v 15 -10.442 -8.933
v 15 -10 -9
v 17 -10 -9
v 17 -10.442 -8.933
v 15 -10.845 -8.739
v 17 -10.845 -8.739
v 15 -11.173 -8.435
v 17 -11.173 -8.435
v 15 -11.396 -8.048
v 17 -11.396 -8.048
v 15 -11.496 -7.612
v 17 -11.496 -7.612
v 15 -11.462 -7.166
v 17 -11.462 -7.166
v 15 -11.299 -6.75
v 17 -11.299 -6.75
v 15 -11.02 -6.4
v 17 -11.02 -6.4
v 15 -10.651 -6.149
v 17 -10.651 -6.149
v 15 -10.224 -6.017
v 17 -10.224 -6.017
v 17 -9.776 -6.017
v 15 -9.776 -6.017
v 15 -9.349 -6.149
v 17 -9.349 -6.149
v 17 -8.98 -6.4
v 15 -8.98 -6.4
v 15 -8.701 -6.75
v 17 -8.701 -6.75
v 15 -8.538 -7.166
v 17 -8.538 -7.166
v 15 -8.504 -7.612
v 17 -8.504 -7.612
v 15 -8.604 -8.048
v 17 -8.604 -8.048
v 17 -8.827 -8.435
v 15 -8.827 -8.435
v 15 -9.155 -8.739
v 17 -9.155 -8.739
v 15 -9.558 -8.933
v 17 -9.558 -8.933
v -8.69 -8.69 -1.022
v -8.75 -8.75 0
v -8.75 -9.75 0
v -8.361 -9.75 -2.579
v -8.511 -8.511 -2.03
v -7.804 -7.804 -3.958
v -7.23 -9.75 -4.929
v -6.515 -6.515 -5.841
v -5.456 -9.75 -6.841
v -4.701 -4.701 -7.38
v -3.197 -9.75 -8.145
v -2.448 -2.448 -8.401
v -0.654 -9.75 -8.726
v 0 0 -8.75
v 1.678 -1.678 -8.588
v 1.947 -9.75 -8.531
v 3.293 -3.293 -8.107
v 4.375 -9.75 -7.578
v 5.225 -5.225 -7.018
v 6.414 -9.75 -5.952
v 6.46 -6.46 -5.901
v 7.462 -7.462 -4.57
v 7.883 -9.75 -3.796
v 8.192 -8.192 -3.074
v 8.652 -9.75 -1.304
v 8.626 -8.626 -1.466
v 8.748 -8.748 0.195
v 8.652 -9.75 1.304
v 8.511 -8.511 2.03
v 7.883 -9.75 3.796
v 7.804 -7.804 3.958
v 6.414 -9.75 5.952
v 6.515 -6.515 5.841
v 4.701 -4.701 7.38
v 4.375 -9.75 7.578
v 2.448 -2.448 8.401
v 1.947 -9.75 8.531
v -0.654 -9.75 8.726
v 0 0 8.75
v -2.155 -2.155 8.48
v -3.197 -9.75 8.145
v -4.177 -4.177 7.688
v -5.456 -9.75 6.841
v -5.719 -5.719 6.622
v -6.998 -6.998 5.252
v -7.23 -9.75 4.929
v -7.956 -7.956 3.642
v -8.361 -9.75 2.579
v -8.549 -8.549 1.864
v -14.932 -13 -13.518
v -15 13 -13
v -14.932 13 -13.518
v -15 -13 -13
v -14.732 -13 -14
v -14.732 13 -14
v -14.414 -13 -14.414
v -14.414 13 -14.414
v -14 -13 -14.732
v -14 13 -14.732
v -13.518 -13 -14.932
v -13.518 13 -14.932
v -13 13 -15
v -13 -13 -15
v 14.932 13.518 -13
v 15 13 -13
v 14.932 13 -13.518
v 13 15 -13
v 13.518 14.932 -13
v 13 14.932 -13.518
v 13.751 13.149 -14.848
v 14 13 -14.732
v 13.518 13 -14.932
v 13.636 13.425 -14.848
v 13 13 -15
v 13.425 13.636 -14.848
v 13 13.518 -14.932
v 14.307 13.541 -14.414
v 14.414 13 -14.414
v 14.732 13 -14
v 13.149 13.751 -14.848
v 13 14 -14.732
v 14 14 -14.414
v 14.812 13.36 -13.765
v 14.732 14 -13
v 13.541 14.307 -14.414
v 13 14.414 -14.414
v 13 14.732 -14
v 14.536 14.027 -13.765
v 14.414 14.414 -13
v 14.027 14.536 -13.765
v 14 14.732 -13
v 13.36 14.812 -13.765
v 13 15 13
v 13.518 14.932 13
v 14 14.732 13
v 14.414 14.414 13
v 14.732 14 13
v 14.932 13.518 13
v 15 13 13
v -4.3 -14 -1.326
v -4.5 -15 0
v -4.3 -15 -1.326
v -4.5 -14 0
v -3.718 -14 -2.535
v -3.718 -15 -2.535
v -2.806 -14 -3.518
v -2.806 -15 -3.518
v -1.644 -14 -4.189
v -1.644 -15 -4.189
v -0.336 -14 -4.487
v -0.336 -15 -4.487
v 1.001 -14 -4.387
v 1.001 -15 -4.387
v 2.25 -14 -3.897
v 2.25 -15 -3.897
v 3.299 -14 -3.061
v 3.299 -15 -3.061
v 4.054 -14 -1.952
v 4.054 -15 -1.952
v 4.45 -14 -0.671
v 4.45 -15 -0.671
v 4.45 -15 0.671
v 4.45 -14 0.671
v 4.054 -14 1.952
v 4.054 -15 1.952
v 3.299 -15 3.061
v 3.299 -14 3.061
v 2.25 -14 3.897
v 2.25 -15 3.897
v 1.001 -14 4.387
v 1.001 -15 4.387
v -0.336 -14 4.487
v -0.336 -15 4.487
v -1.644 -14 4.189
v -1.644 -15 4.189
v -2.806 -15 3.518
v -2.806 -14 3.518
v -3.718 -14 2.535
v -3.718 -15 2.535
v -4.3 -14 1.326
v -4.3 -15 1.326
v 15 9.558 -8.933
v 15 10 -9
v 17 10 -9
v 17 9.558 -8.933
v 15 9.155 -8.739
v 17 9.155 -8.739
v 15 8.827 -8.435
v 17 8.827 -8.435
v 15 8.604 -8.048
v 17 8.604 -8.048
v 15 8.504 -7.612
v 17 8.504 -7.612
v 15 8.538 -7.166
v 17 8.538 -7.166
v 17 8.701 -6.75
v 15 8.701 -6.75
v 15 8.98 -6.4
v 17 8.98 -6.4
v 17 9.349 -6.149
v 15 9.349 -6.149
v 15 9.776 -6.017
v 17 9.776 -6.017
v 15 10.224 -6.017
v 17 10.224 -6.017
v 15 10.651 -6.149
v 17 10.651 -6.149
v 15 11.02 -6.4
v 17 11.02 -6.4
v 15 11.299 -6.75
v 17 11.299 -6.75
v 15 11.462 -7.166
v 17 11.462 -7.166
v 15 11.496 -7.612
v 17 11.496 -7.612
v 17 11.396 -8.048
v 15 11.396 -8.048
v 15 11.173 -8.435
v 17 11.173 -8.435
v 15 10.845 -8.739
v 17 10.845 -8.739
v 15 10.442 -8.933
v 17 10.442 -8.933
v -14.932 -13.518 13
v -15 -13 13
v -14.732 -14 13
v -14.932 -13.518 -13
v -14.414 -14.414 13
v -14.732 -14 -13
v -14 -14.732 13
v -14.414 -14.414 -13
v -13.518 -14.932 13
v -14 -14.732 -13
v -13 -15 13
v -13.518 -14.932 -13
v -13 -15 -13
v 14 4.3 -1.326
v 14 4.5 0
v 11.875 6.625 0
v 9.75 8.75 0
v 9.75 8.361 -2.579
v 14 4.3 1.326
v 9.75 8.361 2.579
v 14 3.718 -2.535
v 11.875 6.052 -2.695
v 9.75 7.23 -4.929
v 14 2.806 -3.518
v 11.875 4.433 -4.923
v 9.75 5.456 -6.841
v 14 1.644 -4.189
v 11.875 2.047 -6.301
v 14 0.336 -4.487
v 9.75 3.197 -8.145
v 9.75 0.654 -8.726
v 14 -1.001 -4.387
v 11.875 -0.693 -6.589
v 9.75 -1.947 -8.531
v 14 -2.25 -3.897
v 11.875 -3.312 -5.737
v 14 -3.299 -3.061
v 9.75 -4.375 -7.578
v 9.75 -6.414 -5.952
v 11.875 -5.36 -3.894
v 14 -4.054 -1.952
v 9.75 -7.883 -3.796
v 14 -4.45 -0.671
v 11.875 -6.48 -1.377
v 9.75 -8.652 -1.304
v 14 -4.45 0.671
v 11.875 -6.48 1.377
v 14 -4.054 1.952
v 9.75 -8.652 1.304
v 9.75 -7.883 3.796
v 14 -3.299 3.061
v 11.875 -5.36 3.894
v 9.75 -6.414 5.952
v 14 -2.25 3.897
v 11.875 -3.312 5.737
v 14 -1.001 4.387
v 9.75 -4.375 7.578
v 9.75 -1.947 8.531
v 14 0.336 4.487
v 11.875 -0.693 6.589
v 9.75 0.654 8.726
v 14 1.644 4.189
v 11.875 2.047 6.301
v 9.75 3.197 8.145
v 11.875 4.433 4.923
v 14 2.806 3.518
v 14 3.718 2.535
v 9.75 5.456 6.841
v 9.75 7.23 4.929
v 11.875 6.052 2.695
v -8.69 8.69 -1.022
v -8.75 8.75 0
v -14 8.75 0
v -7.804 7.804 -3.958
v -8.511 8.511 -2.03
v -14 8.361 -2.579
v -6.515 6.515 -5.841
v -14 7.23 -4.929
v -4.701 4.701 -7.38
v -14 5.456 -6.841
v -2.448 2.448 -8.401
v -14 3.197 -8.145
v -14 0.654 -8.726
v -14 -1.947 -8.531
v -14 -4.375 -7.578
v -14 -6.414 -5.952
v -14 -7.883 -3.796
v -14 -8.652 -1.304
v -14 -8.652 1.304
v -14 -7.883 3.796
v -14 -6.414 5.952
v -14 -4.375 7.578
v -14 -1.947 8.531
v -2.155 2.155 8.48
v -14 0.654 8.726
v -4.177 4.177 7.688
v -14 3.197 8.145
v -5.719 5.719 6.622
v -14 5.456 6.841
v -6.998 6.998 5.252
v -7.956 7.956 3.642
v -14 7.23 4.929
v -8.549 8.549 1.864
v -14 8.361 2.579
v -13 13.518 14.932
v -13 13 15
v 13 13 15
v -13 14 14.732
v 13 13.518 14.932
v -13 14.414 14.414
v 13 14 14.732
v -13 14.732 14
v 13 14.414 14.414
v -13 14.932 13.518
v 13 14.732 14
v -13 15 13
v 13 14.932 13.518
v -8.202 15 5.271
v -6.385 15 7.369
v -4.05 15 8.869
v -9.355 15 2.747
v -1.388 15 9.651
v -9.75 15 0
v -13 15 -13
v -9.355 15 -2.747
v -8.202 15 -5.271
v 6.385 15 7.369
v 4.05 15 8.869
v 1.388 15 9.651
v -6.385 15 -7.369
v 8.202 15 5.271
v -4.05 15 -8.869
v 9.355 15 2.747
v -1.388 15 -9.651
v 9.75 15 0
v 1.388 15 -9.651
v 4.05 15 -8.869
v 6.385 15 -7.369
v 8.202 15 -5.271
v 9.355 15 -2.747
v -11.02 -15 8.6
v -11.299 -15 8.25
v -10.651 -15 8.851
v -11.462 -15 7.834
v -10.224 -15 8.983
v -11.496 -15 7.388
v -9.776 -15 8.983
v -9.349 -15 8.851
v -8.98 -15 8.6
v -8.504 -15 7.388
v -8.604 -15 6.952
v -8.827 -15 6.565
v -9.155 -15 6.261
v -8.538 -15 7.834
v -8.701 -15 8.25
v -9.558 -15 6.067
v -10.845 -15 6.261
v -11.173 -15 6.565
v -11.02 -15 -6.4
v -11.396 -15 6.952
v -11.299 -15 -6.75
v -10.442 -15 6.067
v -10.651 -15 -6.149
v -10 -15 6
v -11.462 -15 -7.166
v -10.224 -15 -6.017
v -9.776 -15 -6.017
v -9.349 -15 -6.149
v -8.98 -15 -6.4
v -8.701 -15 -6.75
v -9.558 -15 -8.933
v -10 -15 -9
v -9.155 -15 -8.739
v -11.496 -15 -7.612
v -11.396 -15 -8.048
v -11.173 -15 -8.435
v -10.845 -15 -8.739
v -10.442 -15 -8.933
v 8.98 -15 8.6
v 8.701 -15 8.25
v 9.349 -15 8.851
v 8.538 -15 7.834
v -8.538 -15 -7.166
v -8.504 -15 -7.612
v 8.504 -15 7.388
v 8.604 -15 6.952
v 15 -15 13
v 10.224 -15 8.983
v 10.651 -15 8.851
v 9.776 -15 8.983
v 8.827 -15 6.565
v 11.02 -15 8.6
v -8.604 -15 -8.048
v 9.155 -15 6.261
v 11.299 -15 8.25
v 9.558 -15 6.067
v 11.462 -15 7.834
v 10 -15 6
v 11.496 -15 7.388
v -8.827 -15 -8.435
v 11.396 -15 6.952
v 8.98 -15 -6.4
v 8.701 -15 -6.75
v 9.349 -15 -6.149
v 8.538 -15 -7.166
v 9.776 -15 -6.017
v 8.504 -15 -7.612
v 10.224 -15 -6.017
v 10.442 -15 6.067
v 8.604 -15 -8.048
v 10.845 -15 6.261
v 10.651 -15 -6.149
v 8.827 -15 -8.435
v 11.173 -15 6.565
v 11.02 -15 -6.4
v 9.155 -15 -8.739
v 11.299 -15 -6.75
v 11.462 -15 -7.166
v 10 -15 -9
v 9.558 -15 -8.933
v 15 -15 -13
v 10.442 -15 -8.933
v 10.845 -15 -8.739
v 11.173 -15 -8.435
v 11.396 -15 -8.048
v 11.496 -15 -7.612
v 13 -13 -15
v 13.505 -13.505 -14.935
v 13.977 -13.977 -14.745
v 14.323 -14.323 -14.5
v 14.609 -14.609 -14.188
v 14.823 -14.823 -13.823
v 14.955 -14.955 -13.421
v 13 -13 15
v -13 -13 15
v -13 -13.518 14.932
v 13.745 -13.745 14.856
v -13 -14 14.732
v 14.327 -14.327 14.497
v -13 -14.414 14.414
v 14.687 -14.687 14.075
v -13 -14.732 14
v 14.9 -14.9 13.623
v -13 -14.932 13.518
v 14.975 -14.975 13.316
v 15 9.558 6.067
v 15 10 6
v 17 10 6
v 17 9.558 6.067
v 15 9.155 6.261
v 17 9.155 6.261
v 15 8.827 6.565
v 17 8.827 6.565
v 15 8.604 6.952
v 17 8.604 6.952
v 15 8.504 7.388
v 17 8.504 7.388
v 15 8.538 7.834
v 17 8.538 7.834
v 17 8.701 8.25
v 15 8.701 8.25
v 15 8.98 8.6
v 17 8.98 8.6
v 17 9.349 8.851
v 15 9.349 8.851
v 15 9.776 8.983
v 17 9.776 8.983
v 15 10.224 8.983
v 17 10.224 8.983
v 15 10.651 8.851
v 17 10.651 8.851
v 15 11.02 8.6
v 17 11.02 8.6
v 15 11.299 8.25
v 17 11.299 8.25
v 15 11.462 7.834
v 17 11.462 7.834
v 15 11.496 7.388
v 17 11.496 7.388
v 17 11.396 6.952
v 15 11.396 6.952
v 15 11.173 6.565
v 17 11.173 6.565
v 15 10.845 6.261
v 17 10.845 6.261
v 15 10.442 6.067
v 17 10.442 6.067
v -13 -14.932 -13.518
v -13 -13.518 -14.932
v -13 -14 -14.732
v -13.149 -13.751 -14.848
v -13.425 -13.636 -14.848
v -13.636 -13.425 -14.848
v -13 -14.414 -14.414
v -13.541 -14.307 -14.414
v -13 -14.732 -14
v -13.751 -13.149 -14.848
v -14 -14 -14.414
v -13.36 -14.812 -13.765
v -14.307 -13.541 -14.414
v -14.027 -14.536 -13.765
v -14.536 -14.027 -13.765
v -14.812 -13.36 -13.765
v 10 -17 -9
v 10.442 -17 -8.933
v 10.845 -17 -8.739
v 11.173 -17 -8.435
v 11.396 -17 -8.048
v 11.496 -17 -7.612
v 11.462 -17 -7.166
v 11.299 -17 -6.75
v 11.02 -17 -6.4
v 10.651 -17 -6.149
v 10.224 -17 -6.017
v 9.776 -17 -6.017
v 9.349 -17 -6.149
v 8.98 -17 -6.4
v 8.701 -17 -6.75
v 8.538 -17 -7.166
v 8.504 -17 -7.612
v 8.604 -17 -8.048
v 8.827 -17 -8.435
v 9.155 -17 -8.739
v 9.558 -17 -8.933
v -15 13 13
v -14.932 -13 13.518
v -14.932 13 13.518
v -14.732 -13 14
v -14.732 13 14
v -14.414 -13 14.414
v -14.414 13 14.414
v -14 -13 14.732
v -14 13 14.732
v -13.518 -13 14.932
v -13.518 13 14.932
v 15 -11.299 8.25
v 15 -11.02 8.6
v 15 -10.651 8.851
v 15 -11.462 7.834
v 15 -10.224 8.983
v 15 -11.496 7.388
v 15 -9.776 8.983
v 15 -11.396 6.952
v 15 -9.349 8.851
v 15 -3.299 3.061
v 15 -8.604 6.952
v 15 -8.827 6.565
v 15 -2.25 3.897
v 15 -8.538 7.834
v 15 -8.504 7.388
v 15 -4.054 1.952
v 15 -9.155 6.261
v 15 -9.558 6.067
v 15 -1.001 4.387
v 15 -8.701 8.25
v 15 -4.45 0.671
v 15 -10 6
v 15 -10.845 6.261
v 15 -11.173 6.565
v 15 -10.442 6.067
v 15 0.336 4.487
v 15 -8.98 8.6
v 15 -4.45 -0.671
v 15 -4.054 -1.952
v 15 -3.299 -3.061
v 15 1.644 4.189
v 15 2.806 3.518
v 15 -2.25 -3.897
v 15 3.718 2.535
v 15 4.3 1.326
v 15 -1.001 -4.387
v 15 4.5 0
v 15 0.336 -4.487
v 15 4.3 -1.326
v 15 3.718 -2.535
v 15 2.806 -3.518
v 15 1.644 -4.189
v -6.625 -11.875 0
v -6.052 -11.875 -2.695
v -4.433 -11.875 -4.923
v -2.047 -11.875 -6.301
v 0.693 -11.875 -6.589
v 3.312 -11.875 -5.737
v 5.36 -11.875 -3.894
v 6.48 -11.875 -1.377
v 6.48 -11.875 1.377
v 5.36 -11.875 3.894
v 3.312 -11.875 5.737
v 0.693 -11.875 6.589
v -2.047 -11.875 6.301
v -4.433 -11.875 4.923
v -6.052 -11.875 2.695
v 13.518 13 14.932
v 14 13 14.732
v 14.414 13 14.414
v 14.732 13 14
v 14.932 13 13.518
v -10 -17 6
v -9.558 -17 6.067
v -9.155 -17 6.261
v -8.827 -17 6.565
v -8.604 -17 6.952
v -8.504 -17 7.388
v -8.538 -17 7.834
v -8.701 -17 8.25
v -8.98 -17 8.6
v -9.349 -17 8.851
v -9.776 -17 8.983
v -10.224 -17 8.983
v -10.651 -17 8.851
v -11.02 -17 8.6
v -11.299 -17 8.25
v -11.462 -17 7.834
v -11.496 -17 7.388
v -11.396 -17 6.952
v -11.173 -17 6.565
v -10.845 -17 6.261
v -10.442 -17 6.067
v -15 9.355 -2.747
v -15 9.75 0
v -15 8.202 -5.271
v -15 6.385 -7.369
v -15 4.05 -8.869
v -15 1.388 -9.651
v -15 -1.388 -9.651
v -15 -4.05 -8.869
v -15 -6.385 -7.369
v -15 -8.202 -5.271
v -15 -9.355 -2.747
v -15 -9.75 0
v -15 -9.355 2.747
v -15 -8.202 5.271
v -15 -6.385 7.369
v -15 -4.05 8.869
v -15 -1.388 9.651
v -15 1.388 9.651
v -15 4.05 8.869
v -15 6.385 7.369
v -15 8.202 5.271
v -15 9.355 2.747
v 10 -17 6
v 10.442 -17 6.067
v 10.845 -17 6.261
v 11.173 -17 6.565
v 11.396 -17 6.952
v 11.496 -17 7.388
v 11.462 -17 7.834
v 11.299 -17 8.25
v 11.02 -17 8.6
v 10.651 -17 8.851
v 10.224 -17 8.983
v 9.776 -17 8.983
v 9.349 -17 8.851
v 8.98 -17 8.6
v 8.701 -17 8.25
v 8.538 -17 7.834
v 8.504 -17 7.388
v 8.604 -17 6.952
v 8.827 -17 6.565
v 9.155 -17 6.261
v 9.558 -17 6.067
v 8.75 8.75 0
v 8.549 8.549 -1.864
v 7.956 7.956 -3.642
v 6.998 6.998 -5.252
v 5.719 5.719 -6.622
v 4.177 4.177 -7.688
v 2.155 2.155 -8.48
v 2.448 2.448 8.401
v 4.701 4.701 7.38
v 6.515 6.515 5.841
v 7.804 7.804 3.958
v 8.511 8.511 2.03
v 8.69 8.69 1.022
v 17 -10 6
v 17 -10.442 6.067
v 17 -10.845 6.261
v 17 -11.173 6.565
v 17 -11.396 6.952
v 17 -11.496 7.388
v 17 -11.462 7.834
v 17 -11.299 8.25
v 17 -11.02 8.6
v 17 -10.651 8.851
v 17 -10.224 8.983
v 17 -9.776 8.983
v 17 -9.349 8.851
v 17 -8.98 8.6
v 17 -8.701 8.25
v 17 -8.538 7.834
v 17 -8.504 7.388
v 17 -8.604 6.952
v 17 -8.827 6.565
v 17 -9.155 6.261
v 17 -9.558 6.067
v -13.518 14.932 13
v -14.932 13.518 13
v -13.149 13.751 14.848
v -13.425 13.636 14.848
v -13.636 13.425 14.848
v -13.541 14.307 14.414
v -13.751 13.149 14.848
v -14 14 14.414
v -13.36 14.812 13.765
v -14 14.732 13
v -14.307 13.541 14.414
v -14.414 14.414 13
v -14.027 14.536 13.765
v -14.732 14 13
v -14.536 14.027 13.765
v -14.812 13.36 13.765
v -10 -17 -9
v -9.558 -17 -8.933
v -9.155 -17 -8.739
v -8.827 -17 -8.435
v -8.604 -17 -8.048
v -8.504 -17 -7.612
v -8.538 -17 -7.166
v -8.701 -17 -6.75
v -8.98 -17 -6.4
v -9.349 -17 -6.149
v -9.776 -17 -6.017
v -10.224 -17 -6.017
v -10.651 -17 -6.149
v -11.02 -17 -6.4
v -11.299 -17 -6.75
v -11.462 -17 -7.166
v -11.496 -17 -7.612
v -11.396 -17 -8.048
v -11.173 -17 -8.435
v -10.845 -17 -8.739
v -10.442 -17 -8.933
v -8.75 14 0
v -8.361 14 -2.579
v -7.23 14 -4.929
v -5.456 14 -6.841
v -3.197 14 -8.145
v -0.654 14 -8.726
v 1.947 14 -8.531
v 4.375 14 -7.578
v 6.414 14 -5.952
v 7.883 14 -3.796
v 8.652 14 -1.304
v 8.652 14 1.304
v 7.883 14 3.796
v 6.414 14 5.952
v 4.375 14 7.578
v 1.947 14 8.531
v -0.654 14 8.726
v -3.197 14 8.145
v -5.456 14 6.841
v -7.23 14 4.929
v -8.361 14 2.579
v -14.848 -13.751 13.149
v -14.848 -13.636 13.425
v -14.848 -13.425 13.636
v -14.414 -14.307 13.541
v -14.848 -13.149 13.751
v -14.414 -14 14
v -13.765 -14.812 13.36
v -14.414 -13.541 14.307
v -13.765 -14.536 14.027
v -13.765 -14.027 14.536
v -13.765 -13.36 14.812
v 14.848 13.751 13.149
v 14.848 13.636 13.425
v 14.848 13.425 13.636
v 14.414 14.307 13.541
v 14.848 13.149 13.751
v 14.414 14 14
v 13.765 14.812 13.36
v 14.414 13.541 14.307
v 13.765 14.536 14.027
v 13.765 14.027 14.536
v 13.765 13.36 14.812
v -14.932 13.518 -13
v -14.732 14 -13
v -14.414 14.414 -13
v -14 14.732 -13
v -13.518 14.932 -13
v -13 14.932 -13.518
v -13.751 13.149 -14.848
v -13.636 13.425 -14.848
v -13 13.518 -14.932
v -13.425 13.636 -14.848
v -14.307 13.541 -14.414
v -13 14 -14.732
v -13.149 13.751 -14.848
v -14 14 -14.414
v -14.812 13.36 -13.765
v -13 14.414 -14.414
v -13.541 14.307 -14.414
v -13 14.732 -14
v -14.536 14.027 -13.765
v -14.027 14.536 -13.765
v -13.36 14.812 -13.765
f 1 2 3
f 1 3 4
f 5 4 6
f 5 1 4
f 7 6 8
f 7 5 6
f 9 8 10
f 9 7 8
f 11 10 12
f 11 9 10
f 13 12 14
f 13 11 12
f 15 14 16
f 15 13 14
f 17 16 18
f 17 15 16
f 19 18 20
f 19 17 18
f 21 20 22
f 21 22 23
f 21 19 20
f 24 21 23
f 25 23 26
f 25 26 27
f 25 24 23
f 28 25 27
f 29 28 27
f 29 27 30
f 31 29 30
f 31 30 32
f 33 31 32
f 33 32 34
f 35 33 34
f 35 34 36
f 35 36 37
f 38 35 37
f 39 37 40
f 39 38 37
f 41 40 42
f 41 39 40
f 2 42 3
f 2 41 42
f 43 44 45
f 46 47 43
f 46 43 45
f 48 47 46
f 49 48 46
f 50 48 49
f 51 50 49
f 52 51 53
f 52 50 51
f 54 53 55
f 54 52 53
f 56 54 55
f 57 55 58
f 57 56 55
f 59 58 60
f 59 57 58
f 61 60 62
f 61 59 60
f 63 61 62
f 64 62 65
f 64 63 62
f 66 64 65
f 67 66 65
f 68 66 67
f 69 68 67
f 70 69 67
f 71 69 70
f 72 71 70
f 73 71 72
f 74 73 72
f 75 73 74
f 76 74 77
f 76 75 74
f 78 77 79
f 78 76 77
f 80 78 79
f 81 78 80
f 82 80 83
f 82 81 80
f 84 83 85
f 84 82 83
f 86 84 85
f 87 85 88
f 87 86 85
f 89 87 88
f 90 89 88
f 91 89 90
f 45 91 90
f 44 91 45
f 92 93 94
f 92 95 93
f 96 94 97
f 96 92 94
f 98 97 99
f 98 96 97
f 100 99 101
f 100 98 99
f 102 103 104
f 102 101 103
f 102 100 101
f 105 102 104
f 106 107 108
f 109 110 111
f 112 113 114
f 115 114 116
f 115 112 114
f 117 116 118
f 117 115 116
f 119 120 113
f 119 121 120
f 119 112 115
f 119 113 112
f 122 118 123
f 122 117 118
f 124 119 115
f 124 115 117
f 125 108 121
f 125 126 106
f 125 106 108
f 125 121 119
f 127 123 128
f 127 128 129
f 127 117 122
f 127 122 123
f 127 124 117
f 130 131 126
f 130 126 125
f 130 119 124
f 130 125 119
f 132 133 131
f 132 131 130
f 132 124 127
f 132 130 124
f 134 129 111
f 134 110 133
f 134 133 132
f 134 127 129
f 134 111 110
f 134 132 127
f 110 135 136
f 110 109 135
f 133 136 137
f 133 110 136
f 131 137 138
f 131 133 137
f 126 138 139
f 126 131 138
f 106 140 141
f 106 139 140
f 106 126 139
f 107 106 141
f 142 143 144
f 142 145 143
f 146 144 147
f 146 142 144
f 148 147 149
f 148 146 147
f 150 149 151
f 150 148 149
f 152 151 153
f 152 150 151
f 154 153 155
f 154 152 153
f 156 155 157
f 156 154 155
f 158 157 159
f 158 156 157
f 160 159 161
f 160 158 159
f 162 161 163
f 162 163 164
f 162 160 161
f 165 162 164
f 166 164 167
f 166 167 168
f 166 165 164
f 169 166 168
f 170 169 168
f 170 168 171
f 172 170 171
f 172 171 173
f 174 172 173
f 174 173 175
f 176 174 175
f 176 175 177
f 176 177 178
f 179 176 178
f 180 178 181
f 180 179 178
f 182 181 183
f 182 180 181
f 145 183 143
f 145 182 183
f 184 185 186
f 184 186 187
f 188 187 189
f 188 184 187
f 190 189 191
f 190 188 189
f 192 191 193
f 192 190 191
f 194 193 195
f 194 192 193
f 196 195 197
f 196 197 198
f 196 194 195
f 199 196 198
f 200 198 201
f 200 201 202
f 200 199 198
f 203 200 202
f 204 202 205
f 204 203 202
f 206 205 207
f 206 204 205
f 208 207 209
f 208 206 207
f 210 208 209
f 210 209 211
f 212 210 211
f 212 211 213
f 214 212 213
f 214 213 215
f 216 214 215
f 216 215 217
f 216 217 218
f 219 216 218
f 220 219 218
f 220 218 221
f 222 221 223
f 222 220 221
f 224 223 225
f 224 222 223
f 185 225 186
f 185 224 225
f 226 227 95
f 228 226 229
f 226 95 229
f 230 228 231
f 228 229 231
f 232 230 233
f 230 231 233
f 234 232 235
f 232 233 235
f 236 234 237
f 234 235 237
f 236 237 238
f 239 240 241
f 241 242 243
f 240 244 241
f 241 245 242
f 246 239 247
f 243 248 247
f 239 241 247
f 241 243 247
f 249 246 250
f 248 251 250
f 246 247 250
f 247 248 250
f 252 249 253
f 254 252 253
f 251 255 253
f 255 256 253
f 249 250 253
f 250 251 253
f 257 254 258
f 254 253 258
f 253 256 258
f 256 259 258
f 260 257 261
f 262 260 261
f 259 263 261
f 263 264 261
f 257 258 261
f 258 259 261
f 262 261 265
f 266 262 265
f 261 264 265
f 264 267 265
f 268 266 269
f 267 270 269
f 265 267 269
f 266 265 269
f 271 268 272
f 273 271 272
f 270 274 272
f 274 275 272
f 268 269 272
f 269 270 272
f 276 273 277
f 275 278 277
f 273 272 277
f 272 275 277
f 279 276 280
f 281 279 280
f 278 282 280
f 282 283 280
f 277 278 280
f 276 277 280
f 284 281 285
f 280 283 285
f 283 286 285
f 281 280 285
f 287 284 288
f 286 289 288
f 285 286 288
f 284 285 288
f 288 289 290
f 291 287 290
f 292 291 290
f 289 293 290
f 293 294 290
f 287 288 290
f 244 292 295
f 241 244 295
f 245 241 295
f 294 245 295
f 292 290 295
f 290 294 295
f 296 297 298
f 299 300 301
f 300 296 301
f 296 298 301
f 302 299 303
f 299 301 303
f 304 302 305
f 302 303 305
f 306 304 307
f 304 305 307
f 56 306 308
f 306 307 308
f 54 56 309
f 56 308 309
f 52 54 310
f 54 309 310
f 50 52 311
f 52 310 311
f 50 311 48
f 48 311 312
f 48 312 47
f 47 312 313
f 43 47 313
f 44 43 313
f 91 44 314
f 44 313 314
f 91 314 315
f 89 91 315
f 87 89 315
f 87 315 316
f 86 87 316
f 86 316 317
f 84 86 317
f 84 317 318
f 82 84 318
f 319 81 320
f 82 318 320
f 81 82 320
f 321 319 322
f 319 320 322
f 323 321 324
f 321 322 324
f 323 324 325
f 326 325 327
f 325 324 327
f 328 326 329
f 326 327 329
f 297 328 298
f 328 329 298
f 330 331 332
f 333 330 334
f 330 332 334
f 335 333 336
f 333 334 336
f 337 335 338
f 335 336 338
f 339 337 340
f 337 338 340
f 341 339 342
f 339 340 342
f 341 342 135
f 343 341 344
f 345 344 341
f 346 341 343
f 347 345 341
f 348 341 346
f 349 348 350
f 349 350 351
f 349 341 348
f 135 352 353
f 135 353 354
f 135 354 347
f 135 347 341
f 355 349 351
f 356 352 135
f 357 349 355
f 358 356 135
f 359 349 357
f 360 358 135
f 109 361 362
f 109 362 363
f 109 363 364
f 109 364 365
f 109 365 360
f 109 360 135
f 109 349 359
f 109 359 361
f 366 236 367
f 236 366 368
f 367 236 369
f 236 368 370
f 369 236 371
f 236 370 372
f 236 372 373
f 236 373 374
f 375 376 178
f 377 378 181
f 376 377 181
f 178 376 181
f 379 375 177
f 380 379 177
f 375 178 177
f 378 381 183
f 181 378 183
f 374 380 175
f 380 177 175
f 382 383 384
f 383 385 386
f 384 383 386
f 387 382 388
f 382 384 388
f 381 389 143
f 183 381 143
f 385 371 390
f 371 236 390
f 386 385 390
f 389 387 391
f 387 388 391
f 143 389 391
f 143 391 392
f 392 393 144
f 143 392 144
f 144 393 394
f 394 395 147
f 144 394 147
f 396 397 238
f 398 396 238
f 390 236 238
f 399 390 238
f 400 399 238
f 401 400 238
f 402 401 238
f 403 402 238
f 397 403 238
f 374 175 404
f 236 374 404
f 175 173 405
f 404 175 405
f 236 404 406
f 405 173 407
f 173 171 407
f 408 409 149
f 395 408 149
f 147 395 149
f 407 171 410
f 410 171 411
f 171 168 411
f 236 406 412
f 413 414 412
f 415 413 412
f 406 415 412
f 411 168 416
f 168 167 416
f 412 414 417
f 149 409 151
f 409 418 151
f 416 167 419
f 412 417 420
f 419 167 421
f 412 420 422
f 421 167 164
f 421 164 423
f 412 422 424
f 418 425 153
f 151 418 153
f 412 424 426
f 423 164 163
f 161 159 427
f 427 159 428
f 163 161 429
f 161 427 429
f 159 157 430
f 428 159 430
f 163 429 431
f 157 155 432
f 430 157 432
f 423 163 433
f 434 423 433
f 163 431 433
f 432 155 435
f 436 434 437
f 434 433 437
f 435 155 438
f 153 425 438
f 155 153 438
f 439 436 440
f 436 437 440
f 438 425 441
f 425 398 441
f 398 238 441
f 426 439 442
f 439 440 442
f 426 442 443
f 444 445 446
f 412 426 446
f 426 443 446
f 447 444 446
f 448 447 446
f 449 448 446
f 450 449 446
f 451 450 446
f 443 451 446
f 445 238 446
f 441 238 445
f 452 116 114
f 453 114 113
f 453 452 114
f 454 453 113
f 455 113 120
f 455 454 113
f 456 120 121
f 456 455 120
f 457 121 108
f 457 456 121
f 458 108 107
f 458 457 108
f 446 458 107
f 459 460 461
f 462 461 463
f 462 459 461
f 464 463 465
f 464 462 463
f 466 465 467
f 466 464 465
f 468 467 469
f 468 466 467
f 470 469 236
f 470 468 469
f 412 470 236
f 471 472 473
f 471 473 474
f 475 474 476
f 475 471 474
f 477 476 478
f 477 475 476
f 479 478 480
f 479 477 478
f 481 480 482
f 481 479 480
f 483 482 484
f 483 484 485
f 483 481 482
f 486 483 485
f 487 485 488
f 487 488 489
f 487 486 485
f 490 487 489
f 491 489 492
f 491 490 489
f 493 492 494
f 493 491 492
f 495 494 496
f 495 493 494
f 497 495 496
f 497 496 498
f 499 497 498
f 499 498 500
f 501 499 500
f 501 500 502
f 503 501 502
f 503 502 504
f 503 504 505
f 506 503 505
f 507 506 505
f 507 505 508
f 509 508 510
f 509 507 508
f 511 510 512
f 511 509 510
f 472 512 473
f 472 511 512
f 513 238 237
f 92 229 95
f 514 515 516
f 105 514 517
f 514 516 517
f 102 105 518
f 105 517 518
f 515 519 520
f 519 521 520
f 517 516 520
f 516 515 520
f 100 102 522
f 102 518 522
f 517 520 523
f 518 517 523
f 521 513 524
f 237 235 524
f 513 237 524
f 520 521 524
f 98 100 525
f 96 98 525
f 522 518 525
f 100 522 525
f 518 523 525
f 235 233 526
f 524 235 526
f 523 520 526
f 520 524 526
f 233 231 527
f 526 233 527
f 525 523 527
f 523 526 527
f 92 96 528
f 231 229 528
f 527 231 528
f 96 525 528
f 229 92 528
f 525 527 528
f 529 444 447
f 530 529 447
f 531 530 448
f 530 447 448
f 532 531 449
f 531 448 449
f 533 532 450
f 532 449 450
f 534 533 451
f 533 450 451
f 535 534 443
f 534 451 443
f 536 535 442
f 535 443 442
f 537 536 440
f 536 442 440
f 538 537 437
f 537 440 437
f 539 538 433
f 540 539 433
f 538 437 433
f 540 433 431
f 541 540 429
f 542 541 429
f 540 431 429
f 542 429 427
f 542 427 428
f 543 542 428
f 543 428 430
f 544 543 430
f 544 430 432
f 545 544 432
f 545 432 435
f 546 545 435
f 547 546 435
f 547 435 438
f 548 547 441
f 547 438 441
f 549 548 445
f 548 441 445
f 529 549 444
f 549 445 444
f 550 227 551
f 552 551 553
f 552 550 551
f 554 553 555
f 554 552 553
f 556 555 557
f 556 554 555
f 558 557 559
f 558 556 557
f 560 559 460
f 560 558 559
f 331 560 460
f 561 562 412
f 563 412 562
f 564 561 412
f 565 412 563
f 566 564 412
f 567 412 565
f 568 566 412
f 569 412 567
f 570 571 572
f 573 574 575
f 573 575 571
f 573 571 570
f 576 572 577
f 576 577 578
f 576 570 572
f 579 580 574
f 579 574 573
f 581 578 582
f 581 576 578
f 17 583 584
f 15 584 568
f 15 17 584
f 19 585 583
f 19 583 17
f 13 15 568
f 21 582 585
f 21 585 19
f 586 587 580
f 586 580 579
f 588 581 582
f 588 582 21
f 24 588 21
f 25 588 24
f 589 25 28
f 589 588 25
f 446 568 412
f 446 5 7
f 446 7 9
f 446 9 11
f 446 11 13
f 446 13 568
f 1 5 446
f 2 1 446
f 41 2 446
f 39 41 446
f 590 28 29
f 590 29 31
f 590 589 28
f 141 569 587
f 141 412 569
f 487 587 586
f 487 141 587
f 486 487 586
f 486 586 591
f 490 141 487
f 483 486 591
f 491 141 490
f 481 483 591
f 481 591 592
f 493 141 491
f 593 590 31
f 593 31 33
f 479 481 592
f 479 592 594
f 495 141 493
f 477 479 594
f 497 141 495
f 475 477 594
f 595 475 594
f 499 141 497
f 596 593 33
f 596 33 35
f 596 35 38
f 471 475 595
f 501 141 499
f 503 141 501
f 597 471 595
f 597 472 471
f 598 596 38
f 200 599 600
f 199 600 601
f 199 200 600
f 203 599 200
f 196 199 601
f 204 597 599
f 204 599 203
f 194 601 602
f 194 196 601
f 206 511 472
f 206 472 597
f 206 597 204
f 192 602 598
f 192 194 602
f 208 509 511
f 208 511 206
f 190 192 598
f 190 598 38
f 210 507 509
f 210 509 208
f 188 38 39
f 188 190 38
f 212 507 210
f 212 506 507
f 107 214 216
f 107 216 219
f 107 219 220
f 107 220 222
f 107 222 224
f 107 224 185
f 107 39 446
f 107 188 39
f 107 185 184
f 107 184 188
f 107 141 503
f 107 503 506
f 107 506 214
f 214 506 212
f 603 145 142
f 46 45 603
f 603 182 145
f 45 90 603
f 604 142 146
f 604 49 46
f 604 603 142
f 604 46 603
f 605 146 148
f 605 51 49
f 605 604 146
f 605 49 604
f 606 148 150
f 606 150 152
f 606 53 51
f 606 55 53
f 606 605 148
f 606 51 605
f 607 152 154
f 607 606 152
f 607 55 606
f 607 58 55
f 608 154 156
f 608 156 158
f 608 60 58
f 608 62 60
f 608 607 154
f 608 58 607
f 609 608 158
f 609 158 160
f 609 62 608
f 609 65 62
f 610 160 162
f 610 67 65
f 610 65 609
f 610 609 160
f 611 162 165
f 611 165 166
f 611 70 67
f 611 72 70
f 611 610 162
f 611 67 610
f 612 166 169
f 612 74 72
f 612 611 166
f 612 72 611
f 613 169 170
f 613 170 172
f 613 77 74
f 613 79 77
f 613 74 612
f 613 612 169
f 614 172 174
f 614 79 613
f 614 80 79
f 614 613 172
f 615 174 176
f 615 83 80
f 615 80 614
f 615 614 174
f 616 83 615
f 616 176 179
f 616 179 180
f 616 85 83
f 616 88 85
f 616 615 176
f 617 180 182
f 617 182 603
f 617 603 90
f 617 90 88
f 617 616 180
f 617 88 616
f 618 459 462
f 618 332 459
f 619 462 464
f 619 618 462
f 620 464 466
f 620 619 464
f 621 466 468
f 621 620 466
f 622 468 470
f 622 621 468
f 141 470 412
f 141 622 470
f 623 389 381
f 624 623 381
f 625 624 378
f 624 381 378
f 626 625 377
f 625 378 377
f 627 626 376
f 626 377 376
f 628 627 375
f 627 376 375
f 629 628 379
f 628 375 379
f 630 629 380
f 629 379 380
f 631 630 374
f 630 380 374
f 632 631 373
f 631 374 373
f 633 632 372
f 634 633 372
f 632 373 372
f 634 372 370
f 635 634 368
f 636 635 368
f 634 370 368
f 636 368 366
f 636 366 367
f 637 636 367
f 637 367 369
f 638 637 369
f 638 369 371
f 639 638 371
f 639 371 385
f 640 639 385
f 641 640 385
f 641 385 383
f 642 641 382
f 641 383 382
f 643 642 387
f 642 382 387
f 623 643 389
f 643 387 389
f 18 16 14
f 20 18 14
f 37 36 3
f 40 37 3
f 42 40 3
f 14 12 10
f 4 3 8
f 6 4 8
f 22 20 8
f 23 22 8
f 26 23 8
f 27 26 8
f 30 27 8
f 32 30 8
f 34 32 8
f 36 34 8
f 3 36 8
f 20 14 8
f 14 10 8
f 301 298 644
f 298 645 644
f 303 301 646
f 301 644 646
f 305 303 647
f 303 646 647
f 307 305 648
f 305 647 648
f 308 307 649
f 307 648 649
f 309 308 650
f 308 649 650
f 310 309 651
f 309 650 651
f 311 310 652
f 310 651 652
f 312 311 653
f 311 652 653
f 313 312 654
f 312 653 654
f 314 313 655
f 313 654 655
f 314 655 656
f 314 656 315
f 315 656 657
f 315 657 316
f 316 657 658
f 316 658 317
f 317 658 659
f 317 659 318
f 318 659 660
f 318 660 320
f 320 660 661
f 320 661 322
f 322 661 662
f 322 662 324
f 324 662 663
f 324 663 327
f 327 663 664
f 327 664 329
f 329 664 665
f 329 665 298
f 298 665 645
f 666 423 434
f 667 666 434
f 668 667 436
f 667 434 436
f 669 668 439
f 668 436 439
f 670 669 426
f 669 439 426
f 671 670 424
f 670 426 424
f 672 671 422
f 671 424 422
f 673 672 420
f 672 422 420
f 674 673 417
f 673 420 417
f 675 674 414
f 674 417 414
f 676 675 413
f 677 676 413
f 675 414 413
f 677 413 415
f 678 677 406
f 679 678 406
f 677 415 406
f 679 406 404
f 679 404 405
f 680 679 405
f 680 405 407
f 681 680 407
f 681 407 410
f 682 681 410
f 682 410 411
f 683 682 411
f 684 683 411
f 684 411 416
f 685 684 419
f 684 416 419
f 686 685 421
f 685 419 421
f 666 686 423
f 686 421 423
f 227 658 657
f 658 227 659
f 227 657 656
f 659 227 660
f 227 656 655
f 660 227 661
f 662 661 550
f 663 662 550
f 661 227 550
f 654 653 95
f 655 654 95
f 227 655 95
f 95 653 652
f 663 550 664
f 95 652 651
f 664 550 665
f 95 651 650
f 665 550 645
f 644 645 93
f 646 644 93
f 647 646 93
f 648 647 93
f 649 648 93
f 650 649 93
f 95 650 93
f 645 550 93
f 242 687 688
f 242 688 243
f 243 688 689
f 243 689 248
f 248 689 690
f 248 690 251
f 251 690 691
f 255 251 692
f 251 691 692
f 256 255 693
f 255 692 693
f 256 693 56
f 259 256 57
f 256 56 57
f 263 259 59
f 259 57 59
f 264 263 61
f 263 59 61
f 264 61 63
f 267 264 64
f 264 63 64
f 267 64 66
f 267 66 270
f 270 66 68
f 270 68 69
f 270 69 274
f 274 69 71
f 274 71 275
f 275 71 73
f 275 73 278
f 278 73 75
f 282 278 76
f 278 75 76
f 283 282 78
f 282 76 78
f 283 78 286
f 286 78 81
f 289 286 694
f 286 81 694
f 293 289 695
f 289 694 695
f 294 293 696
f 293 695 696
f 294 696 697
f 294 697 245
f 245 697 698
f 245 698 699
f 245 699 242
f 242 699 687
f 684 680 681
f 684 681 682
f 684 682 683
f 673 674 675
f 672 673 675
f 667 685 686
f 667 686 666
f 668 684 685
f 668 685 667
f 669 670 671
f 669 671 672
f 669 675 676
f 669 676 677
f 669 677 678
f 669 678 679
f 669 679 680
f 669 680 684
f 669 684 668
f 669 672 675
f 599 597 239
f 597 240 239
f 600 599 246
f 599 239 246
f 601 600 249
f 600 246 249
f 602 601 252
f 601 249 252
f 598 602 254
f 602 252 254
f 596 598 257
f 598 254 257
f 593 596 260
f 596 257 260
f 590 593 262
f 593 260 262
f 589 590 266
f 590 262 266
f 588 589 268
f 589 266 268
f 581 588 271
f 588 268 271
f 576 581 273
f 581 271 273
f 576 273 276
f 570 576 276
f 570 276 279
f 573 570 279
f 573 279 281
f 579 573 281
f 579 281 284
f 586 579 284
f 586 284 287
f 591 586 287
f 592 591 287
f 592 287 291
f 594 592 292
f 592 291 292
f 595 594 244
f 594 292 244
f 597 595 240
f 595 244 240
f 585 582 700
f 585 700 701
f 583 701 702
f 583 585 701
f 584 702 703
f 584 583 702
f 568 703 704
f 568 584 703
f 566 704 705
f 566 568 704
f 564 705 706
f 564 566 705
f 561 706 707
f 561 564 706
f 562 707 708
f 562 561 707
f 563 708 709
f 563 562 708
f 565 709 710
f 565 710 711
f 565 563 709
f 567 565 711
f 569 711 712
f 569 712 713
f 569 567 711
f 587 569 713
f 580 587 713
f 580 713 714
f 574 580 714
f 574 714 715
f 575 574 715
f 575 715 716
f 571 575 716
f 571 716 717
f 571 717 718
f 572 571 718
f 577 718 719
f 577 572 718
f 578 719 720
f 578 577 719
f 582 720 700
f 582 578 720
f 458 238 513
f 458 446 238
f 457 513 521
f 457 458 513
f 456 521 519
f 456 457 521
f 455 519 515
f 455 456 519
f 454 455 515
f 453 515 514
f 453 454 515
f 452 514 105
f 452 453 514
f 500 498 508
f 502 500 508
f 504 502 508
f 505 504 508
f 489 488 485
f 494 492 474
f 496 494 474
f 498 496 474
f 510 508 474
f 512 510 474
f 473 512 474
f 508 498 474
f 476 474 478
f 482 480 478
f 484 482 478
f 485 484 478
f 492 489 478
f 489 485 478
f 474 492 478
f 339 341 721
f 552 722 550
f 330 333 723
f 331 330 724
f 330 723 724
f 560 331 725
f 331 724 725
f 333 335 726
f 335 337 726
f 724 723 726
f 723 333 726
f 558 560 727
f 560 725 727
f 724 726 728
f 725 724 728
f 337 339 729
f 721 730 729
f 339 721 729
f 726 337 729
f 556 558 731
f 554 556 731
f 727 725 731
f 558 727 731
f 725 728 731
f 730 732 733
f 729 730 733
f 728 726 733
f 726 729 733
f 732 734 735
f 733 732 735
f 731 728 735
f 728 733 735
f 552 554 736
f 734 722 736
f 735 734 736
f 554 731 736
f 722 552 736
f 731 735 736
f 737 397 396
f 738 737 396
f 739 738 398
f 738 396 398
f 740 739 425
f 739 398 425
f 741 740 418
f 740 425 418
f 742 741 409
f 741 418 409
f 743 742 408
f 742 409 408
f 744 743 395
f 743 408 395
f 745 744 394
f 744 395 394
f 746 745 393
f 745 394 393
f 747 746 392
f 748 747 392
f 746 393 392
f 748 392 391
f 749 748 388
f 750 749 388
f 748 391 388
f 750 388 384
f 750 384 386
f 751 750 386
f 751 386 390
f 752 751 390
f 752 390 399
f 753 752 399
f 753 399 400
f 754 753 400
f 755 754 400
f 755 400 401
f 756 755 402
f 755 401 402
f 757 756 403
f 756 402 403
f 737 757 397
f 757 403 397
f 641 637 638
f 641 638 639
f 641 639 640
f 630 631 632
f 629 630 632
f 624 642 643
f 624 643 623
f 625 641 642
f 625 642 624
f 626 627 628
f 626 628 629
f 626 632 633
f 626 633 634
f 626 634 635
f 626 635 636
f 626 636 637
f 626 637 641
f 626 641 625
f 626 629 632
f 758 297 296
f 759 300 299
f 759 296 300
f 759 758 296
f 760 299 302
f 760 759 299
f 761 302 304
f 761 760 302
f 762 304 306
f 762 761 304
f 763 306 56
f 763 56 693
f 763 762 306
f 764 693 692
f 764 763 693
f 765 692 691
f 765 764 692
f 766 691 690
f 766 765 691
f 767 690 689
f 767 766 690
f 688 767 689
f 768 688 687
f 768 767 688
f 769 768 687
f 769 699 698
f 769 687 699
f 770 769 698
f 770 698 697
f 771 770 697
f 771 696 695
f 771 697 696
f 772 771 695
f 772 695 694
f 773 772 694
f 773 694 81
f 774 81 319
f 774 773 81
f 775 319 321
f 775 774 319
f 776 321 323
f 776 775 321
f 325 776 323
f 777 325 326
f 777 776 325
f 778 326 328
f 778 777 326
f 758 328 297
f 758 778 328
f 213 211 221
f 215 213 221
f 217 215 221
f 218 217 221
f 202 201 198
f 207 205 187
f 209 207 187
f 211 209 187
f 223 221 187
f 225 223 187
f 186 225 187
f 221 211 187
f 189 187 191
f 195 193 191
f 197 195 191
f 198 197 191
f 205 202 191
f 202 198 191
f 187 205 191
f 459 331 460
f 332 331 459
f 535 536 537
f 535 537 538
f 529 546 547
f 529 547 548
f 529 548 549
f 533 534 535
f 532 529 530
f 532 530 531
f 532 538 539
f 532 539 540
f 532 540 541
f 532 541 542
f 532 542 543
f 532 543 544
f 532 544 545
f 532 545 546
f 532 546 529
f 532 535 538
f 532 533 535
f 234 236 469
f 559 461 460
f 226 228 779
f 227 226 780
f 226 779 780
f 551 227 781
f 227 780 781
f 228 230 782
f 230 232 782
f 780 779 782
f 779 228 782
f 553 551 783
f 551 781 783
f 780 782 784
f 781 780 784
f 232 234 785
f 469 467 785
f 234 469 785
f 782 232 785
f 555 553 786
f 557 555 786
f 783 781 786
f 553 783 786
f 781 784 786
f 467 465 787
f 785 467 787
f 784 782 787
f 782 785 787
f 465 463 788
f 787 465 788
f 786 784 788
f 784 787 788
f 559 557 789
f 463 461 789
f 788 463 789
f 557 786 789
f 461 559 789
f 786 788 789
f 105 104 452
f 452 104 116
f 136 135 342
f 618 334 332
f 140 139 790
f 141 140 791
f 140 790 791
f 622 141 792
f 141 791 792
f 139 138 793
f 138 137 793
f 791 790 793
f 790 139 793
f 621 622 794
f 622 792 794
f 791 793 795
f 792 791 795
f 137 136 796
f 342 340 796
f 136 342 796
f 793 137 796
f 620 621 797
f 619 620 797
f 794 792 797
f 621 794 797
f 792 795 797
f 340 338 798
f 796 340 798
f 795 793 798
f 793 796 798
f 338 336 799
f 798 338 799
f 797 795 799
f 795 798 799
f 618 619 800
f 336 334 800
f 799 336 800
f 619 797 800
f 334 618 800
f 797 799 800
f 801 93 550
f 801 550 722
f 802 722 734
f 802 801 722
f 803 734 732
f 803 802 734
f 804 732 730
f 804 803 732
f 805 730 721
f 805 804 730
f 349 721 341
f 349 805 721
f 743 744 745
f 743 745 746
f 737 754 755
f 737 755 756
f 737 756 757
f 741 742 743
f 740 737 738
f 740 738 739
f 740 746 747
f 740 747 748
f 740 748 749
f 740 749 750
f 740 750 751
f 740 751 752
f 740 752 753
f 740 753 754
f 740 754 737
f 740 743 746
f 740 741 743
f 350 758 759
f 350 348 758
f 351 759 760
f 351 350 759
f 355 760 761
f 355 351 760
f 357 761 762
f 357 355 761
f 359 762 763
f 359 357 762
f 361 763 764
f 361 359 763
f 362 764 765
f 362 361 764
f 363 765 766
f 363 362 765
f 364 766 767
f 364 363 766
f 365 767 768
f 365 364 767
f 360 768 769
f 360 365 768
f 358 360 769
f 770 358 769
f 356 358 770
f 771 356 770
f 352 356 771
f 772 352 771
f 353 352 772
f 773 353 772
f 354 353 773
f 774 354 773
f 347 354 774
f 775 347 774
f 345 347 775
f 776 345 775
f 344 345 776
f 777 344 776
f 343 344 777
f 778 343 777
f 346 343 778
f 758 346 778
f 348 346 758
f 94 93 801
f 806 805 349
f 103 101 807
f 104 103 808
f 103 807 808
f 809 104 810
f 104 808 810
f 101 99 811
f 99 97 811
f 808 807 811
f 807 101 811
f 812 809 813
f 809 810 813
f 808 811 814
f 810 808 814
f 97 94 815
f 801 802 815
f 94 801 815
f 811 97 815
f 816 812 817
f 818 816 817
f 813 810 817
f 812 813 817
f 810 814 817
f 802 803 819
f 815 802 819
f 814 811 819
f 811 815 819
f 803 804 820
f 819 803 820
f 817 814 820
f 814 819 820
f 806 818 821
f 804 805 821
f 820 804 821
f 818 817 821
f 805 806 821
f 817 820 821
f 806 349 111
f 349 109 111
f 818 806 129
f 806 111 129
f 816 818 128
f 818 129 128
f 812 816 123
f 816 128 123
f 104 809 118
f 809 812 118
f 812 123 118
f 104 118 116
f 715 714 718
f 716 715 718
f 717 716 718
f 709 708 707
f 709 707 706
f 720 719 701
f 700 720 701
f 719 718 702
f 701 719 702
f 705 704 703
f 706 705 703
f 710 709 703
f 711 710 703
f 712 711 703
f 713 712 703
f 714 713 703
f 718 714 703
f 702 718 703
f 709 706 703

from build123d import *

# Parameters (mm, degrees)
SKETCH_1_W      = 30
SKETCH_1_H      = 30
EXTRUDE_1_DEPTH = 15
SKETCH_5_R      = 1.5
EXTRUDE_2_DEPTH = 2
FILLET_1_R      = 2


with BuildPart() as part:
    # Эскиз1 → Бобышка-Вытянуть1 (new body, symmetric)
    with BuildSketch(Plane(origin=(0, 0, 0), x_dir=(1, 0, 0), z_dir=(0, 1, 0))):
        Rectangle(SKETCH_1_W, SKETCH_1_H)
    extrude(amount=EXTRUDE_1_DEPTH, both=True)

    # Эскиз4 → Вырез-Повернуть1 (revolve, cut)
    with BuildSketch(Plane.XY):
        Polygon((-4.5, -15), (-4.5, -14), (-8.75, -9.75), (-8.75, 14), (-9.75, 15), (0, 15), (0, -15), align=None)
    cut_revolve_1 = revolve(axis=Axis((0, 15, 0), (0, -1, 0)), mode=Mode.SUBTRACT)

    # Эскиз5 → Бобышка-Вытянуть2 (add)
    with BuildSketch(Plane.XZ.offset(15)):
        with Locations(Location((-10, 7.5, 0), (0, 0, 270))):  # turned: the seam where the file's is
            Circle(SKETCH_5_R)
        with Locations(Location((-10, -7.5, 0), (0, 0, 270))):  # turned: the seam where the file's is
            Circle(SKETCH_5_R)
        with Locations(Location((10, -7.5, 0), (0, 0, 270))):  # turned: the seam where the file's is
            Circle(SKETCH_5_R)
        with Locations(Location((10, 7.5, 0), (0, 0, 270))):  # turned: the seam where the file's is
            Circle(SKETCH_5_R)
    extrude_2 = extrude(amount=EXTRUDE_2_DEPTH)

    # Зеркальное отражение1: Вырез-Повернуть1, Бобышка-Вытянуть2 across plane
    add(cut_revolve_1.mirror(Plane(origin=(0, 0, 0), x_dir=(0, 0, 1), z_dir=(0.707106781, 0.707106781, 0))), mode=Mode.SUBTRACT)
    add(extrude_2.mirror(Plane(origin=(0, 0, 0), x_dir=(0, 0, 1), z_dir=(0.707106781, 0.707106781, 0))))

    # Скругление1
    fillet_1_edges = [part.edges().sort_by_distance(p)[0] for p in [
        (-15, 15, 0),
        (0, 15, 15),
        (15, 15, 0),
        (0, -15, 15),
        (-15, -15, 0),
        (0, -15, -15),
        (15, 0, 15),
        (-15, 0, 15),
        (-15, 0, -15),
        (15, 0, -15),
        (0, 15, -15),
    ]]
    fillet(fillet_1_edges, radius=FILLET_1_R)


solid = part.part
